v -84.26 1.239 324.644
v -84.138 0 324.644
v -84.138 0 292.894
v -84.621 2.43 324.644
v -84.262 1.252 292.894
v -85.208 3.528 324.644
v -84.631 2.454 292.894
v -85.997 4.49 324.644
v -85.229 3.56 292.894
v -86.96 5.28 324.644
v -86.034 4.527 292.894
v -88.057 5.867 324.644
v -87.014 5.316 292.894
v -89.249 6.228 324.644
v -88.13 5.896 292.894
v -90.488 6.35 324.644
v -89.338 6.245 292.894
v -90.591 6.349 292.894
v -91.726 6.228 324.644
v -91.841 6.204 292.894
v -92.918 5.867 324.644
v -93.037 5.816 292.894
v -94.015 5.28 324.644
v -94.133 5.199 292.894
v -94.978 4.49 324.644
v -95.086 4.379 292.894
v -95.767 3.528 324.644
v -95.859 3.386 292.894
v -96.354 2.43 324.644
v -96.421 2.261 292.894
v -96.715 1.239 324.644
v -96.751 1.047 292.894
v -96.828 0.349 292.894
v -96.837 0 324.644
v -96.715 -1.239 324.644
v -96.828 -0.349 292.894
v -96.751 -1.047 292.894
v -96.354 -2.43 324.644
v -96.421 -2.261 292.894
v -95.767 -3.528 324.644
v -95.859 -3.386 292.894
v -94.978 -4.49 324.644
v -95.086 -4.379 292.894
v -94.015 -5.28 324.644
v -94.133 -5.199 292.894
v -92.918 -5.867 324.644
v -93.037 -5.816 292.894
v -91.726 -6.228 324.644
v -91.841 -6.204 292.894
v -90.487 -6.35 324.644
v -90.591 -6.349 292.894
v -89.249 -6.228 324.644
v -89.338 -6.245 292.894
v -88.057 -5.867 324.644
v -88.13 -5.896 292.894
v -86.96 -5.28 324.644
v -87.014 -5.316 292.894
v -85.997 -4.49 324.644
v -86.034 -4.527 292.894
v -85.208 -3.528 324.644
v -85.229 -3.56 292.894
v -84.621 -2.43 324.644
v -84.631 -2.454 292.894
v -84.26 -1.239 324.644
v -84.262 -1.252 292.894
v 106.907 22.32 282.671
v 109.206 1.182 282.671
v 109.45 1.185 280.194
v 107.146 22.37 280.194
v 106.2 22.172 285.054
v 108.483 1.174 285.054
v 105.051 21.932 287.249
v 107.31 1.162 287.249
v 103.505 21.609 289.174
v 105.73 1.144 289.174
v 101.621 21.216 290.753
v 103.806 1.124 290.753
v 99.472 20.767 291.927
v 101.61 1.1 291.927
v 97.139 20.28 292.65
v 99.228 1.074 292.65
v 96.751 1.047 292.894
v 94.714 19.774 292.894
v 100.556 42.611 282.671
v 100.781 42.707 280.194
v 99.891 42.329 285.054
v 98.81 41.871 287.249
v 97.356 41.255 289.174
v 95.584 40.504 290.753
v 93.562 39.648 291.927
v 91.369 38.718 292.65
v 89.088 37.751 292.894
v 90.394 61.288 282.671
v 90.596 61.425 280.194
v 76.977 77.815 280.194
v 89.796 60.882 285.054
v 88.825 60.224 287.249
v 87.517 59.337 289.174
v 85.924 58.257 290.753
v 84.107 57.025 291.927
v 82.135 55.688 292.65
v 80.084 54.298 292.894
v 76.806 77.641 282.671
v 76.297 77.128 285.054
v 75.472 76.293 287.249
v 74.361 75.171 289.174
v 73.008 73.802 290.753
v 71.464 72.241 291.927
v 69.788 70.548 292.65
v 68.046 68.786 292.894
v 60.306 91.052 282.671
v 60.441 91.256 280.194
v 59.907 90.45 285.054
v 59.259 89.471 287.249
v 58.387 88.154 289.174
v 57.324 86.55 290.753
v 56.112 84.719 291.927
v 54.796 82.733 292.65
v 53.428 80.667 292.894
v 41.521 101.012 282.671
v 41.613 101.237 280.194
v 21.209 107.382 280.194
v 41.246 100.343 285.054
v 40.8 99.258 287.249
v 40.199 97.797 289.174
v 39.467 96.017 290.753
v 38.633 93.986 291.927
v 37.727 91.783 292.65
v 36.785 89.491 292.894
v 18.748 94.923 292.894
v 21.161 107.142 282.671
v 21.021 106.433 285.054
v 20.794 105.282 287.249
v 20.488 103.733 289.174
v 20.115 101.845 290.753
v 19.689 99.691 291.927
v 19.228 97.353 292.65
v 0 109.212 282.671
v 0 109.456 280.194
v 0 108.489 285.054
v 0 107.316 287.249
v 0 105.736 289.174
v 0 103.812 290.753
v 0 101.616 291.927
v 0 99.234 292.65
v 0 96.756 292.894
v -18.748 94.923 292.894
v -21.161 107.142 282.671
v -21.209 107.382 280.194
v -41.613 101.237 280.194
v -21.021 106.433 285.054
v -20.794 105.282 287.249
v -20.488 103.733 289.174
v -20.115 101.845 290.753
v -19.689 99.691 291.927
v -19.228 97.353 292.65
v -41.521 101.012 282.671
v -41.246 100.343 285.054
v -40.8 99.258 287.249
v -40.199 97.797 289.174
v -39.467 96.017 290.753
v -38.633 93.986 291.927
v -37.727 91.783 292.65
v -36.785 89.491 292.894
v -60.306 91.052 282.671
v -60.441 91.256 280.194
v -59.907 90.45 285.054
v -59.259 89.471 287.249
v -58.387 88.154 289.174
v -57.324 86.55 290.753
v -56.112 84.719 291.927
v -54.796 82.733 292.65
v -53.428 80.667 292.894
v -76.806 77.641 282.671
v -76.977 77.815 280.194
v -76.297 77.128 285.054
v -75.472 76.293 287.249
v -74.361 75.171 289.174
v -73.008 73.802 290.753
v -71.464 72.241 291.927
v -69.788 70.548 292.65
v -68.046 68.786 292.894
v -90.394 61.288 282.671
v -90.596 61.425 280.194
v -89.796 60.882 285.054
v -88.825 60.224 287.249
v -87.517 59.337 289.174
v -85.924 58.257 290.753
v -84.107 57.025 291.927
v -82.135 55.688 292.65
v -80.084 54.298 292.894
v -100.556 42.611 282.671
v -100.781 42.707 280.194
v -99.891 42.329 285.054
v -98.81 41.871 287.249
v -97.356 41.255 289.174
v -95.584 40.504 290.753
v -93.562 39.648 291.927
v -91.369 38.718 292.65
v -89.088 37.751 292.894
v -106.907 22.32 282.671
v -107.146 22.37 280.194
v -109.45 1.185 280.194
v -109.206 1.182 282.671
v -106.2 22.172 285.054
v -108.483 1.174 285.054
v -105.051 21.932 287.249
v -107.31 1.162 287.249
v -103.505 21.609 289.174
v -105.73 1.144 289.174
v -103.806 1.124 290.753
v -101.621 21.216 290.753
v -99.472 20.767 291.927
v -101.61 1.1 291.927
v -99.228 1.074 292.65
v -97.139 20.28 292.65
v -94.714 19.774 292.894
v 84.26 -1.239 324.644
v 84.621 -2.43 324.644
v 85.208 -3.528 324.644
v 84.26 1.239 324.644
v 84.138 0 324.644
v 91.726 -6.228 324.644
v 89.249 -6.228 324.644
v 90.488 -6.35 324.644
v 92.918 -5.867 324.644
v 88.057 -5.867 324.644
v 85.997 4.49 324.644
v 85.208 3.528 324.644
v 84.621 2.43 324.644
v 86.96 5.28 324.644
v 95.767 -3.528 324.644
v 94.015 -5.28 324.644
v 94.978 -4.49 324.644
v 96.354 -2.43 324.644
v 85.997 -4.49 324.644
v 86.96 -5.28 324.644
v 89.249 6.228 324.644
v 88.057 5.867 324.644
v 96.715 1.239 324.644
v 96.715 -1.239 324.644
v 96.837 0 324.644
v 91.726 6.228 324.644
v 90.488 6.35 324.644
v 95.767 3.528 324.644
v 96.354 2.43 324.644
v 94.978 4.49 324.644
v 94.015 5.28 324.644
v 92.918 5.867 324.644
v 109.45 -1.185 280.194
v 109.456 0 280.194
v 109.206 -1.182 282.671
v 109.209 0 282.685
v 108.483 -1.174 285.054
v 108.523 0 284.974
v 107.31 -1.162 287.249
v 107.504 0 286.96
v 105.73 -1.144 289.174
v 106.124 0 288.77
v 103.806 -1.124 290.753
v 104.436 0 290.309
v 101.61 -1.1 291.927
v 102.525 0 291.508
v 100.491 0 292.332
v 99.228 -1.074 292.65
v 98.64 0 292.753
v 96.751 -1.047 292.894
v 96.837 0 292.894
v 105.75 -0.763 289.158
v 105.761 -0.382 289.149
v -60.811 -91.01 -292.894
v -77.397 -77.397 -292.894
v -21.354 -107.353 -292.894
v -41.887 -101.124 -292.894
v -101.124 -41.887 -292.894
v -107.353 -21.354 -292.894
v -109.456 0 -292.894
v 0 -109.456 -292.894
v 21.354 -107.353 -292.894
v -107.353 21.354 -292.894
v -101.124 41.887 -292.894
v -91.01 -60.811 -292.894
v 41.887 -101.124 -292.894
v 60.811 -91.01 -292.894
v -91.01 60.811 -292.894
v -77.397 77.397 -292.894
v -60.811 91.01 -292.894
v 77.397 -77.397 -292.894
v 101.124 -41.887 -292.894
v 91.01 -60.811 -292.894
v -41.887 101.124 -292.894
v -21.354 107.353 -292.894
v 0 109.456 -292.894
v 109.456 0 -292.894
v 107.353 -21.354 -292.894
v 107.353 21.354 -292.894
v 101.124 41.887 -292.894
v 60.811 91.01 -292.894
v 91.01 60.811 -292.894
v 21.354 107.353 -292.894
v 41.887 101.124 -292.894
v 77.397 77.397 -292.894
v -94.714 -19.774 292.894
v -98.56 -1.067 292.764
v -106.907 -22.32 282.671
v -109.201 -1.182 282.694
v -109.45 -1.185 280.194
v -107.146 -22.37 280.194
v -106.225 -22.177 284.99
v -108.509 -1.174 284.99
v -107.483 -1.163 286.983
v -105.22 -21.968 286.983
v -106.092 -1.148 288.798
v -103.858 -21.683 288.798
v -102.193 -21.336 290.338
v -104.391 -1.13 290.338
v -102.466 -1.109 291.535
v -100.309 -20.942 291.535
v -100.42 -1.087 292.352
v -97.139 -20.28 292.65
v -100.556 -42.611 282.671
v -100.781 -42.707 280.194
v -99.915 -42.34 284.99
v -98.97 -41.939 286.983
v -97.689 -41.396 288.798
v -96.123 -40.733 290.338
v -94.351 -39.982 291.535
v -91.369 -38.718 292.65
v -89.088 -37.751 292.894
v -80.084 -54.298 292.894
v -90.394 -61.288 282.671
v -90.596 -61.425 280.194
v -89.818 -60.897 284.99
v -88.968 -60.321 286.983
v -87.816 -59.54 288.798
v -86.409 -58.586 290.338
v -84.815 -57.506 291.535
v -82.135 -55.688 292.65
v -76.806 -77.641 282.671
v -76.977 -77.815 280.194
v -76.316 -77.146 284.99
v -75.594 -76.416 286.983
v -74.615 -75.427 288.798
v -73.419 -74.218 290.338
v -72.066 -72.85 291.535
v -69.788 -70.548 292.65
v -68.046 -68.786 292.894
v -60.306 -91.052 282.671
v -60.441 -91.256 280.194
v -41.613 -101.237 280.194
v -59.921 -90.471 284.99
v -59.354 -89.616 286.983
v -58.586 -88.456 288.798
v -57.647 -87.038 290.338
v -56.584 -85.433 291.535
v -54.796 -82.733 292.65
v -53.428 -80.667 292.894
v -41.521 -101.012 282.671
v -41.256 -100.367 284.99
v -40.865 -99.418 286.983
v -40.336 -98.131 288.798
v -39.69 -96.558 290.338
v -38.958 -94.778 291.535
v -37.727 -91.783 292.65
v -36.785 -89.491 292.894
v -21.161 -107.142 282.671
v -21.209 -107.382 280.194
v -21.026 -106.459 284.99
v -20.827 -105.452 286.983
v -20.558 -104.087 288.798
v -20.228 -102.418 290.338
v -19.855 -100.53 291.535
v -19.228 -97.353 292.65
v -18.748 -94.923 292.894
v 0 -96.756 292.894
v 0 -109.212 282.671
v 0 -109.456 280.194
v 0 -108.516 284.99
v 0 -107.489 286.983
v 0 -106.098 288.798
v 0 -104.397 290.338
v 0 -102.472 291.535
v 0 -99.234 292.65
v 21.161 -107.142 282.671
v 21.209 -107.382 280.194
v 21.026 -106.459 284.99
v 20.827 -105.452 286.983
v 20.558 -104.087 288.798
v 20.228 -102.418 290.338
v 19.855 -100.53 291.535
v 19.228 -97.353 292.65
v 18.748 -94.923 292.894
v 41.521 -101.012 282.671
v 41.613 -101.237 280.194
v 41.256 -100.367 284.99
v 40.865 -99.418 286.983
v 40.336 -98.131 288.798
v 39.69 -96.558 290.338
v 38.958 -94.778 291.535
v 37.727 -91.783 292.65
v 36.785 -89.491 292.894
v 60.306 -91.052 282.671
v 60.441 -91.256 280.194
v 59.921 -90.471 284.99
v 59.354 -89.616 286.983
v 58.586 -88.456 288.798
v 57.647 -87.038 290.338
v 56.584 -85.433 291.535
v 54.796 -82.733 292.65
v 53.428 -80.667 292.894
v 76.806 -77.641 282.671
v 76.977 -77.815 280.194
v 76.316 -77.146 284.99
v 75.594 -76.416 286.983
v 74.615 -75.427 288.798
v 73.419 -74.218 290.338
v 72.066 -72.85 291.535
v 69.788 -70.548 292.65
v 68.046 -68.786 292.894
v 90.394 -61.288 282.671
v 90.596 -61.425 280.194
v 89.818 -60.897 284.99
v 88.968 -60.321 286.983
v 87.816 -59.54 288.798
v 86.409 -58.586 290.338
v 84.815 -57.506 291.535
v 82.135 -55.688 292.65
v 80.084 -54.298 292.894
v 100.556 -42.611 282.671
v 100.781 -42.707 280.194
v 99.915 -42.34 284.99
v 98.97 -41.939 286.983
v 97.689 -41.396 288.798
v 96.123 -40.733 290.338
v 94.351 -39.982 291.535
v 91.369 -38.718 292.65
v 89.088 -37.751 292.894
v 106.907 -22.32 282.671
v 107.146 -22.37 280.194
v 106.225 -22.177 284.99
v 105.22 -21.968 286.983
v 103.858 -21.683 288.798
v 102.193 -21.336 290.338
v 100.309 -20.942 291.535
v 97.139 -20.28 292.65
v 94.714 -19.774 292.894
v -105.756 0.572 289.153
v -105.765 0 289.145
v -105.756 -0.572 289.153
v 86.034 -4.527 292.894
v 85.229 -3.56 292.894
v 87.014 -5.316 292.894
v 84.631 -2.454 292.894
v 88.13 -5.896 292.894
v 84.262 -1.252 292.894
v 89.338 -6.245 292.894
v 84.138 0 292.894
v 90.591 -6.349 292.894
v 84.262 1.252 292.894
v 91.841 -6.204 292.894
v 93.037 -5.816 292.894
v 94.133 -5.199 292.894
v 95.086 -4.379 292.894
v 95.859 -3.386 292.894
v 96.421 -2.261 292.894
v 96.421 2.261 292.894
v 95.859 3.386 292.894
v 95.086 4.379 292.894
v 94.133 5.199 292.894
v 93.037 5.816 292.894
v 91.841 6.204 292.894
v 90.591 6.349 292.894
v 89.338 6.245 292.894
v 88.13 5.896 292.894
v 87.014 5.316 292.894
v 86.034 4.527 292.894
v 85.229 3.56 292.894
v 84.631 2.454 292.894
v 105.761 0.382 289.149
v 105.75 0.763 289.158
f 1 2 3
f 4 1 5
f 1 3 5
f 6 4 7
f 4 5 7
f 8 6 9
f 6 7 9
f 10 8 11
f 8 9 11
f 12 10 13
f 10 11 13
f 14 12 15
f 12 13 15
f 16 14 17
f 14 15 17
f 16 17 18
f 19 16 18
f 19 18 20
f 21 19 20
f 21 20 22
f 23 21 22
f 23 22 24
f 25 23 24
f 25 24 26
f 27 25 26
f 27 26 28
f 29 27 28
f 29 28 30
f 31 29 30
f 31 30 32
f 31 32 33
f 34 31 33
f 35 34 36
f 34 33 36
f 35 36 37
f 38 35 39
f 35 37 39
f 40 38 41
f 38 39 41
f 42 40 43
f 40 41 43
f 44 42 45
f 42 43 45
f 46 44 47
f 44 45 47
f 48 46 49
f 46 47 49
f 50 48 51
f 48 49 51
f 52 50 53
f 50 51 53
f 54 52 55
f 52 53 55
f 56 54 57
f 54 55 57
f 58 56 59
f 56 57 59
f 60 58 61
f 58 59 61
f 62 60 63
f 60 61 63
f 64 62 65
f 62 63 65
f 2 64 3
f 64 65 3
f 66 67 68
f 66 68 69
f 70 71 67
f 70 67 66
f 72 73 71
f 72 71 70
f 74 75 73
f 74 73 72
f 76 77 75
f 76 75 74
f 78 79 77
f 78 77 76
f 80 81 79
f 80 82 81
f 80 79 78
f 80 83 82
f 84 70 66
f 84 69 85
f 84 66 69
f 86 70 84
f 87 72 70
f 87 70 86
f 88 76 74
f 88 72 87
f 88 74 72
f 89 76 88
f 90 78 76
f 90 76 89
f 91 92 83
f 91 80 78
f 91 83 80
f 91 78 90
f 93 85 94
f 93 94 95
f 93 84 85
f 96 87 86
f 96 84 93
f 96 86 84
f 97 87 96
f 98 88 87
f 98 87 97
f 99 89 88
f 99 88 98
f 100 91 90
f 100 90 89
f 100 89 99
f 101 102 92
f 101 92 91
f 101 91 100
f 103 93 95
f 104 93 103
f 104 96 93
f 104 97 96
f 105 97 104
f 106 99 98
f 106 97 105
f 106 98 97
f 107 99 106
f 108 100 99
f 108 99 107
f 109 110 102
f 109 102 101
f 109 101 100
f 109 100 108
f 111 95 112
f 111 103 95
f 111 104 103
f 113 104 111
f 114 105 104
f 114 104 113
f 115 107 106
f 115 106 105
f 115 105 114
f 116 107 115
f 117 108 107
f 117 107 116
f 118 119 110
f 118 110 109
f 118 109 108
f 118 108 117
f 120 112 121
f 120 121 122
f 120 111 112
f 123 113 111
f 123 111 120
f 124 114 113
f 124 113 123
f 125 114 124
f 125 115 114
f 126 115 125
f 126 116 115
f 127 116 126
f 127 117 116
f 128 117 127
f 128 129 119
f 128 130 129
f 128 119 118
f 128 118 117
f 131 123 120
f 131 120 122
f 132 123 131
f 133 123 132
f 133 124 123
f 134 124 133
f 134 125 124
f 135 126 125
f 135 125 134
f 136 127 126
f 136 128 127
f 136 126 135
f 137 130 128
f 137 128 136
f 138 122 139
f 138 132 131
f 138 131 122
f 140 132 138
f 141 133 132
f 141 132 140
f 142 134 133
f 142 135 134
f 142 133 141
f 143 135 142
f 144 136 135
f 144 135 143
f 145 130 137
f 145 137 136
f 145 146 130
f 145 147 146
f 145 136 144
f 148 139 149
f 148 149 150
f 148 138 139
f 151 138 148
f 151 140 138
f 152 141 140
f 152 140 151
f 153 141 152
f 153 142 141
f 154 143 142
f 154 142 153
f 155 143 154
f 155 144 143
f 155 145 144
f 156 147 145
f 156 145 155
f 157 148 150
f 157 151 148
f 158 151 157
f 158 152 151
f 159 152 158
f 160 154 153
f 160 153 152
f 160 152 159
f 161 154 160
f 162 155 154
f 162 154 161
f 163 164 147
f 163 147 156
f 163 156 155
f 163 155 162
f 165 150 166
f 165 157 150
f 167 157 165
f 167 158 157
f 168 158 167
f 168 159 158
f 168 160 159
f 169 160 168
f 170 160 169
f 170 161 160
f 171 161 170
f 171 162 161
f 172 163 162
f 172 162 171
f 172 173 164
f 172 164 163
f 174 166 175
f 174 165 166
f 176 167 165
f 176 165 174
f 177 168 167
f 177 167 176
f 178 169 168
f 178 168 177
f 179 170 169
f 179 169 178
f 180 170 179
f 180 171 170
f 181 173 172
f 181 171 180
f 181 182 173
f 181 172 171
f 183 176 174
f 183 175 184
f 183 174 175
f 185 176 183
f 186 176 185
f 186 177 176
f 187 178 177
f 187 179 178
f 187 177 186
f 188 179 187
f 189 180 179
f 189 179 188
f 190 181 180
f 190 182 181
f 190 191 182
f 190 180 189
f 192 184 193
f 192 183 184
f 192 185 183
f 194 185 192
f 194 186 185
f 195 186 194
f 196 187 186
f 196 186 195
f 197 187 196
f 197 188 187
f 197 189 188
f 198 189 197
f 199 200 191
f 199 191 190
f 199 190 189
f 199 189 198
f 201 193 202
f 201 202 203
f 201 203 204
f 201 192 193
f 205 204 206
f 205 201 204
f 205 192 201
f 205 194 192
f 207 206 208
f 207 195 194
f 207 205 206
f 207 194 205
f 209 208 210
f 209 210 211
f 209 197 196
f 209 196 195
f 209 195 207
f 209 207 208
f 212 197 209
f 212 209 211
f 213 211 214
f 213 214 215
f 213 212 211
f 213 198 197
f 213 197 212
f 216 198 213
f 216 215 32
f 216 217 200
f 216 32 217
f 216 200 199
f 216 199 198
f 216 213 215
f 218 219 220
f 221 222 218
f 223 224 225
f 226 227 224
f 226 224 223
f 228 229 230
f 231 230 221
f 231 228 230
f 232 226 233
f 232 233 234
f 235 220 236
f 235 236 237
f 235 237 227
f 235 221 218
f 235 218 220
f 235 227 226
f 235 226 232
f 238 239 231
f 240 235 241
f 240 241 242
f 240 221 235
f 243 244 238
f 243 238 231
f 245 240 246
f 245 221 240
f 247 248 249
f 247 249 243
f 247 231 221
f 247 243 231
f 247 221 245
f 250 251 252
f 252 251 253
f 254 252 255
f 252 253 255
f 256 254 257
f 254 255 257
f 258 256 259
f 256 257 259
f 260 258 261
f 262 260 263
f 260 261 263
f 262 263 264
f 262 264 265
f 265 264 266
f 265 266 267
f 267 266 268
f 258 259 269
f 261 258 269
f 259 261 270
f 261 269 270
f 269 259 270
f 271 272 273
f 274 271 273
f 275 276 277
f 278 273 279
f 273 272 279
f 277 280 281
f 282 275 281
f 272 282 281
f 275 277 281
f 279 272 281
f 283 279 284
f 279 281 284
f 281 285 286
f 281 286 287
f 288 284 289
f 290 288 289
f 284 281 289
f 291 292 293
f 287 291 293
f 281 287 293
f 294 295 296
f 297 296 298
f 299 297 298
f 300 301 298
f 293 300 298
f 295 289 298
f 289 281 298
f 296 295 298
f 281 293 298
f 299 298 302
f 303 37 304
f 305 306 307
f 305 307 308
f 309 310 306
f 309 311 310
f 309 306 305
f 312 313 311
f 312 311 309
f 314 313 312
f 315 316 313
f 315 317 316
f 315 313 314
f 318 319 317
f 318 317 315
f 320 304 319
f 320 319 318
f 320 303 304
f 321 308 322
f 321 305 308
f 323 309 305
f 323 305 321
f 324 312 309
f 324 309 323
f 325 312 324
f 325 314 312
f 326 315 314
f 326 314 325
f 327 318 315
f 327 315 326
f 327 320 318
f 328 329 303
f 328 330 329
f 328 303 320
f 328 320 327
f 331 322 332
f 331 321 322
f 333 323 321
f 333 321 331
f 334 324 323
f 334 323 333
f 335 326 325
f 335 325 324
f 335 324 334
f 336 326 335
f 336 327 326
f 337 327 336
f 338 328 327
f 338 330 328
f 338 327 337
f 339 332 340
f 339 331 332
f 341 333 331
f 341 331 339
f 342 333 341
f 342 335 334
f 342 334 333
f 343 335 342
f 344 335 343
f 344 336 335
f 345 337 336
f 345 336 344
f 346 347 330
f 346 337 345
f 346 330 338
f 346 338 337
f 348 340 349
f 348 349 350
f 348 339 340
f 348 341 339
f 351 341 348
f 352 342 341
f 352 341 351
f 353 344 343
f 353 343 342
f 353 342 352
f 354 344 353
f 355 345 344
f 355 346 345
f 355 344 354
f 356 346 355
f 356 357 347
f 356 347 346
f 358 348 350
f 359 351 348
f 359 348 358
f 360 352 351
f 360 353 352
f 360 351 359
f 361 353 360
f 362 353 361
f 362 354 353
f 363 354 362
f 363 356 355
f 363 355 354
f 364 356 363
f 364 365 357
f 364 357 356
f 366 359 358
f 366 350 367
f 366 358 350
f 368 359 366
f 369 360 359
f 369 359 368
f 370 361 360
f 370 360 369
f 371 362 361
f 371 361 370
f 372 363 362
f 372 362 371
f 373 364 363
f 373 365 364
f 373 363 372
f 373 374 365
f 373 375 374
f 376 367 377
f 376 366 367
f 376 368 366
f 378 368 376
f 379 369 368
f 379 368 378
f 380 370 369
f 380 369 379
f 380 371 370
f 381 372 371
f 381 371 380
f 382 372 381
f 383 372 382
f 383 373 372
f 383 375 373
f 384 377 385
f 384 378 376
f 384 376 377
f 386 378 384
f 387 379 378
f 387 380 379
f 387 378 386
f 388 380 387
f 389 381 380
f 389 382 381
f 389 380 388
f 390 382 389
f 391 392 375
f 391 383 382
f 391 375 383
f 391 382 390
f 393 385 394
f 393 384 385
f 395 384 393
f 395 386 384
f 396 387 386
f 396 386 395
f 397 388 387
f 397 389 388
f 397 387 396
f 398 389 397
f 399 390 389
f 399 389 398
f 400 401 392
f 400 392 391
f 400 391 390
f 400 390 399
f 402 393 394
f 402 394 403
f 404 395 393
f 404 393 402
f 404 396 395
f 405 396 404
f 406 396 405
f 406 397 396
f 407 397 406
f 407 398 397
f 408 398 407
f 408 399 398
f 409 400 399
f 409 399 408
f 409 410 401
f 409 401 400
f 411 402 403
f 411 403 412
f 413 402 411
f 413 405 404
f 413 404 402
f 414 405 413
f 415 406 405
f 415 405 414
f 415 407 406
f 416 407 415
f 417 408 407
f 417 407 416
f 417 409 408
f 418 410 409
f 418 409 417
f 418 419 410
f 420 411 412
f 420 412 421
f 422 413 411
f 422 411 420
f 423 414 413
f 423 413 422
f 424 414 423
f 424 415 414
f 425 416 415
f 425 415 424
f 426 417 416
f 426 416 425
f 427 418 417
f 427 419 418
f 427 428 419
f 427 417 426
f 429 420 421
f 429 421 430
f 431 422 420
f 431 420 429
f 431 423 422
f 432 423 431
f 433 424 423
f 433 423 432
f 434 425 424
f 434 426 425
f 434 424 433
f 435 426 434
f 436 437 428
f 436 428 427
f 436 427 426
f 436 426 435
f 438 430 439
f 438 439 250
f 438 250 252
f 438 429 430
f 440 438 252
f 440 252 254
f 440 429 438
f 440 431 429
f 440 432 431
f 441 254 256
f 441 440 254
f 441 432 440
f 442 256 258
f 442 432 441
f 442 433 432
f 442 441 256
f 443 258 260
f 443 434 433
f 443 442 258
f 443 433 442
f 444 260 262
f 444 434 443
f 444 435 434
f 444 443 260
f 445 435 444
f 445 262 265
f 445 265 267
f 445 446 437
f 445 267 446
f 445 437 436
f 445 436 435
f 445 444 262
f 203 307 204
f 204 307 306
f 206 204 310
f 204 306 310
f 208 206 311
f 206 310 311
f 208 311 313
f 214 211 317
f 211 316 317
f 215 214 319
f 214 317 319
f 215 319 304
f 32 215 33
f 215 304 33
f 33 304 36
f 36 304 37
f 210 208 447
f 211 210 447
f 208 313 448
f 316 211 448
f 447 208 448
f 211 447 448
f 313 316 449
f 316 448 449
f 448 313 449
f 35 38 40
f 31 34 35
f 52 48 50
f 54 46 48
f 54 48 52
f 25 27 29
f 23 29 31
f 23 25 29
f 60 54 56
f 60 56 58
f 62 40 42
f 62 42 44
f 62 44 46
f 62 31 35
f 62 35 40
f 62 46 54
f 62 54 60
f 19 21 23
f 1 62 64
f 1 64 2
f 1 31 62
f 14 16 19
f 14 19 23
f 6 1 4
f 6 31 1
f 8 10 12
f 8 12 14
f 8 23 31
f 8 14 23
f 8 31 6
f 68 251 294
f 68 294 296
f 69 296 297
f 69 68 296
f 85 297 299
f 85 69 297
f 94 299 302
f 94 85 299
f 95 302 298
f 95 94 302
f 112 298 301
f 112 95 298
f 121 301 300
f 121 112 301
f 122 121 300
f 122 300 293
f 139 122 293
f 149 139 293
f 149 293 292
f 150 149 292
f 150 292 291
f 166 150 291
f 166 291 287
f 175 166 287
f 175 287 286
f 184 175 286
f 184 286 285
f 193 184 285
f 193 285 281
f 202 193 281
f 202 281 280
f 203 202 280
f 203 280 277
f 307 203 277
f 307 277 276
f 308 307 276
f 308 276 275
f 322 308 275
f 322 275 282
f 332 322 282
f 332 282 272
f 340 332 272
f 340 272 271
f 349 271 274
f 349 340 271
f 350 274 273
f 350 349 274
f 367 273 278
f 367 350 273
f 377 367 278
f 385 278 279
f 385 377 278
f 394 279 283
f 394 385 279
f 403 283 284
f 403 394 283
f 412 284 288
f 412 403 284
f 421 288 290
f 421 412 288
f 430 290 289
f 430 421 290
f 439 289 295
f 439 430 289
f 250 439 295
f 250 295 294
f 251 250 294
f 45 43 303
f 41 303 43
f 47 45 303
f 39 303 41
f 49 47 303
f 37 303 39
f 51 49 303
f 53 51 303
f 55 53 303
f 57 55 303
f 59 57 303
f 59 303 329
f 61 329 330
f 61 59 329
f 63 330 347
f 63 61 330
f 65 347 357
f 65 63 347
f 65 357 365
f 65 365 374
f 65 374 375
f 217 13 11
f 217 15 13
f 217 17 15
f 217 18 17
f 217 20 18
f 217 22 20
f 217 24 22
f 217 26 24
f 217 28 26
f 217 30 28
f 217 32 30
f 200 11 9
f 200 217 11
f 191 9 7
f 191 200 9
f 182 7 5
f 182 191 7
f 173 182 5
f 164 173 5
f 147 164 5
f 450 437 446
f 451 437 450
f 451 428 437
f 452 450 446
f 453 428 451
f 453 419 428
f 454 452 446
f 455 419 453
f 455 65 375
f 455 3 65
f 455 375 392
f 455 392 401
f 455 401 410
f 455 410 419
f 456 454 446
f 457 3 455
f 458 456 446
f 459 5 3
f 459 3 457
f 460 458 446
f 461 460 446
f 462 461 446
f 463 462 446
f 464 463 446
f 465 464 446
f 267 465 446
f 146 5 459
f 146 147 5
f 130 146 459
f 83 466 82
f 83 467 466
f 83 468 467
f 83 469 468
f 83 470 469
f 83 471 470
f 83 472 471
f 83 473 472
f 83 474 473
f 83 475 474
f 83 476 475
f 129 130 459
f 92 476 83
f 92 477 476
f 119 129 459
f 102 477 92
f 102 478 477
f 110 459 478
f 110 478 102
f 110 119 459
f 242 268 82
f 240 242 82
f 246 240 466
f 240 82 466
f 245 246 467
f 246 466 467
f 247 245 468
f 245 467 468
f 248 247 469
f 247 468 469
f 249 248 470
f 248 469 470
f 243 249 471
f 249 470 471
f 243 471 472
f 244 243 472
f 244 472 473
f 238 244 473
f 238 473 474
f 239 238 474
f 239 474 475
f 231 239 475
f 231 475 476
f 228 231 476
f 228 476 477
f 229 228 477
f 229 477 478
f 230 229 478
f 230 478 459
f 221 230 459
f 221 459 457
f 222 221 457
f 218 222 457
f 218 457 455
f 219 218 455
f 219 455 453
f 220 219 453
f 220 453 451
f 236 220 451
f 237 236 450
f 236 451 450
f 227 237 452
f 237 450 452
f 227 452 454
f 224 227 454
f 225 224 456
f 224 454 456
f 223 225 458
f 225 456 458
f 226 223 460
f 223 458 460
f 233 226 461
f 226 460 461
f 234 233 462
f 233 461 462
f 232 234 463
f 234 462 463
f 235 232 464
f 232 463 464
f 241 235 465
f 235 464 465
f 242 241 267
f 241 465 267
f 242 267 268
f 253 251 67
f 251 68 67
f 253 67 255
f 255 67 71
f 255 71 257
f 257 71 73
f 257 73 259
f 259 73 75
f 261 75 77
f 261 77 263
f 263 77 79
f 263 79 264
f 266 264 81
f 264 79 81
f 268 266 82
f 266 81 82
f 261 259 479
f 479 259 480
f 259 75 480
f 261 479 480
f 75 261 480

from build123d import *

# Parameters (mm, degrees)
F0_R     = 109.45622
F1_DEPTH = 292.89375
F2_R     = 6.35
F3_DEPTH = 31.75
F4_R     = 12.7


with BuildPart() as f1:
    # F0 (on Top) → F1 (new body, symmetric)
    with BuildSketch(Plane.XY):
        Circle(F0_R)
    extrude(amount=F1_DEPTH, both=True)

    # F2 (on face) → F3 (join)
    with BuildSketch(Plane.XY.offset(292.89375)):
        with Locations((90.4875, 0)):
            Circle(F2_R)
        with Locations((-90.4875, 0)):
            Circle(F2_R)
    extrude(amount=F3_DEPTH)

    # F4
    f4_edges = [f1.edges().sort_by_distance(p)[0] for p in [
        (-109.45622, 0, 292.89375),
    ]]
    fillet(f4_edges, radius=F4_R)


solid = f1.part
